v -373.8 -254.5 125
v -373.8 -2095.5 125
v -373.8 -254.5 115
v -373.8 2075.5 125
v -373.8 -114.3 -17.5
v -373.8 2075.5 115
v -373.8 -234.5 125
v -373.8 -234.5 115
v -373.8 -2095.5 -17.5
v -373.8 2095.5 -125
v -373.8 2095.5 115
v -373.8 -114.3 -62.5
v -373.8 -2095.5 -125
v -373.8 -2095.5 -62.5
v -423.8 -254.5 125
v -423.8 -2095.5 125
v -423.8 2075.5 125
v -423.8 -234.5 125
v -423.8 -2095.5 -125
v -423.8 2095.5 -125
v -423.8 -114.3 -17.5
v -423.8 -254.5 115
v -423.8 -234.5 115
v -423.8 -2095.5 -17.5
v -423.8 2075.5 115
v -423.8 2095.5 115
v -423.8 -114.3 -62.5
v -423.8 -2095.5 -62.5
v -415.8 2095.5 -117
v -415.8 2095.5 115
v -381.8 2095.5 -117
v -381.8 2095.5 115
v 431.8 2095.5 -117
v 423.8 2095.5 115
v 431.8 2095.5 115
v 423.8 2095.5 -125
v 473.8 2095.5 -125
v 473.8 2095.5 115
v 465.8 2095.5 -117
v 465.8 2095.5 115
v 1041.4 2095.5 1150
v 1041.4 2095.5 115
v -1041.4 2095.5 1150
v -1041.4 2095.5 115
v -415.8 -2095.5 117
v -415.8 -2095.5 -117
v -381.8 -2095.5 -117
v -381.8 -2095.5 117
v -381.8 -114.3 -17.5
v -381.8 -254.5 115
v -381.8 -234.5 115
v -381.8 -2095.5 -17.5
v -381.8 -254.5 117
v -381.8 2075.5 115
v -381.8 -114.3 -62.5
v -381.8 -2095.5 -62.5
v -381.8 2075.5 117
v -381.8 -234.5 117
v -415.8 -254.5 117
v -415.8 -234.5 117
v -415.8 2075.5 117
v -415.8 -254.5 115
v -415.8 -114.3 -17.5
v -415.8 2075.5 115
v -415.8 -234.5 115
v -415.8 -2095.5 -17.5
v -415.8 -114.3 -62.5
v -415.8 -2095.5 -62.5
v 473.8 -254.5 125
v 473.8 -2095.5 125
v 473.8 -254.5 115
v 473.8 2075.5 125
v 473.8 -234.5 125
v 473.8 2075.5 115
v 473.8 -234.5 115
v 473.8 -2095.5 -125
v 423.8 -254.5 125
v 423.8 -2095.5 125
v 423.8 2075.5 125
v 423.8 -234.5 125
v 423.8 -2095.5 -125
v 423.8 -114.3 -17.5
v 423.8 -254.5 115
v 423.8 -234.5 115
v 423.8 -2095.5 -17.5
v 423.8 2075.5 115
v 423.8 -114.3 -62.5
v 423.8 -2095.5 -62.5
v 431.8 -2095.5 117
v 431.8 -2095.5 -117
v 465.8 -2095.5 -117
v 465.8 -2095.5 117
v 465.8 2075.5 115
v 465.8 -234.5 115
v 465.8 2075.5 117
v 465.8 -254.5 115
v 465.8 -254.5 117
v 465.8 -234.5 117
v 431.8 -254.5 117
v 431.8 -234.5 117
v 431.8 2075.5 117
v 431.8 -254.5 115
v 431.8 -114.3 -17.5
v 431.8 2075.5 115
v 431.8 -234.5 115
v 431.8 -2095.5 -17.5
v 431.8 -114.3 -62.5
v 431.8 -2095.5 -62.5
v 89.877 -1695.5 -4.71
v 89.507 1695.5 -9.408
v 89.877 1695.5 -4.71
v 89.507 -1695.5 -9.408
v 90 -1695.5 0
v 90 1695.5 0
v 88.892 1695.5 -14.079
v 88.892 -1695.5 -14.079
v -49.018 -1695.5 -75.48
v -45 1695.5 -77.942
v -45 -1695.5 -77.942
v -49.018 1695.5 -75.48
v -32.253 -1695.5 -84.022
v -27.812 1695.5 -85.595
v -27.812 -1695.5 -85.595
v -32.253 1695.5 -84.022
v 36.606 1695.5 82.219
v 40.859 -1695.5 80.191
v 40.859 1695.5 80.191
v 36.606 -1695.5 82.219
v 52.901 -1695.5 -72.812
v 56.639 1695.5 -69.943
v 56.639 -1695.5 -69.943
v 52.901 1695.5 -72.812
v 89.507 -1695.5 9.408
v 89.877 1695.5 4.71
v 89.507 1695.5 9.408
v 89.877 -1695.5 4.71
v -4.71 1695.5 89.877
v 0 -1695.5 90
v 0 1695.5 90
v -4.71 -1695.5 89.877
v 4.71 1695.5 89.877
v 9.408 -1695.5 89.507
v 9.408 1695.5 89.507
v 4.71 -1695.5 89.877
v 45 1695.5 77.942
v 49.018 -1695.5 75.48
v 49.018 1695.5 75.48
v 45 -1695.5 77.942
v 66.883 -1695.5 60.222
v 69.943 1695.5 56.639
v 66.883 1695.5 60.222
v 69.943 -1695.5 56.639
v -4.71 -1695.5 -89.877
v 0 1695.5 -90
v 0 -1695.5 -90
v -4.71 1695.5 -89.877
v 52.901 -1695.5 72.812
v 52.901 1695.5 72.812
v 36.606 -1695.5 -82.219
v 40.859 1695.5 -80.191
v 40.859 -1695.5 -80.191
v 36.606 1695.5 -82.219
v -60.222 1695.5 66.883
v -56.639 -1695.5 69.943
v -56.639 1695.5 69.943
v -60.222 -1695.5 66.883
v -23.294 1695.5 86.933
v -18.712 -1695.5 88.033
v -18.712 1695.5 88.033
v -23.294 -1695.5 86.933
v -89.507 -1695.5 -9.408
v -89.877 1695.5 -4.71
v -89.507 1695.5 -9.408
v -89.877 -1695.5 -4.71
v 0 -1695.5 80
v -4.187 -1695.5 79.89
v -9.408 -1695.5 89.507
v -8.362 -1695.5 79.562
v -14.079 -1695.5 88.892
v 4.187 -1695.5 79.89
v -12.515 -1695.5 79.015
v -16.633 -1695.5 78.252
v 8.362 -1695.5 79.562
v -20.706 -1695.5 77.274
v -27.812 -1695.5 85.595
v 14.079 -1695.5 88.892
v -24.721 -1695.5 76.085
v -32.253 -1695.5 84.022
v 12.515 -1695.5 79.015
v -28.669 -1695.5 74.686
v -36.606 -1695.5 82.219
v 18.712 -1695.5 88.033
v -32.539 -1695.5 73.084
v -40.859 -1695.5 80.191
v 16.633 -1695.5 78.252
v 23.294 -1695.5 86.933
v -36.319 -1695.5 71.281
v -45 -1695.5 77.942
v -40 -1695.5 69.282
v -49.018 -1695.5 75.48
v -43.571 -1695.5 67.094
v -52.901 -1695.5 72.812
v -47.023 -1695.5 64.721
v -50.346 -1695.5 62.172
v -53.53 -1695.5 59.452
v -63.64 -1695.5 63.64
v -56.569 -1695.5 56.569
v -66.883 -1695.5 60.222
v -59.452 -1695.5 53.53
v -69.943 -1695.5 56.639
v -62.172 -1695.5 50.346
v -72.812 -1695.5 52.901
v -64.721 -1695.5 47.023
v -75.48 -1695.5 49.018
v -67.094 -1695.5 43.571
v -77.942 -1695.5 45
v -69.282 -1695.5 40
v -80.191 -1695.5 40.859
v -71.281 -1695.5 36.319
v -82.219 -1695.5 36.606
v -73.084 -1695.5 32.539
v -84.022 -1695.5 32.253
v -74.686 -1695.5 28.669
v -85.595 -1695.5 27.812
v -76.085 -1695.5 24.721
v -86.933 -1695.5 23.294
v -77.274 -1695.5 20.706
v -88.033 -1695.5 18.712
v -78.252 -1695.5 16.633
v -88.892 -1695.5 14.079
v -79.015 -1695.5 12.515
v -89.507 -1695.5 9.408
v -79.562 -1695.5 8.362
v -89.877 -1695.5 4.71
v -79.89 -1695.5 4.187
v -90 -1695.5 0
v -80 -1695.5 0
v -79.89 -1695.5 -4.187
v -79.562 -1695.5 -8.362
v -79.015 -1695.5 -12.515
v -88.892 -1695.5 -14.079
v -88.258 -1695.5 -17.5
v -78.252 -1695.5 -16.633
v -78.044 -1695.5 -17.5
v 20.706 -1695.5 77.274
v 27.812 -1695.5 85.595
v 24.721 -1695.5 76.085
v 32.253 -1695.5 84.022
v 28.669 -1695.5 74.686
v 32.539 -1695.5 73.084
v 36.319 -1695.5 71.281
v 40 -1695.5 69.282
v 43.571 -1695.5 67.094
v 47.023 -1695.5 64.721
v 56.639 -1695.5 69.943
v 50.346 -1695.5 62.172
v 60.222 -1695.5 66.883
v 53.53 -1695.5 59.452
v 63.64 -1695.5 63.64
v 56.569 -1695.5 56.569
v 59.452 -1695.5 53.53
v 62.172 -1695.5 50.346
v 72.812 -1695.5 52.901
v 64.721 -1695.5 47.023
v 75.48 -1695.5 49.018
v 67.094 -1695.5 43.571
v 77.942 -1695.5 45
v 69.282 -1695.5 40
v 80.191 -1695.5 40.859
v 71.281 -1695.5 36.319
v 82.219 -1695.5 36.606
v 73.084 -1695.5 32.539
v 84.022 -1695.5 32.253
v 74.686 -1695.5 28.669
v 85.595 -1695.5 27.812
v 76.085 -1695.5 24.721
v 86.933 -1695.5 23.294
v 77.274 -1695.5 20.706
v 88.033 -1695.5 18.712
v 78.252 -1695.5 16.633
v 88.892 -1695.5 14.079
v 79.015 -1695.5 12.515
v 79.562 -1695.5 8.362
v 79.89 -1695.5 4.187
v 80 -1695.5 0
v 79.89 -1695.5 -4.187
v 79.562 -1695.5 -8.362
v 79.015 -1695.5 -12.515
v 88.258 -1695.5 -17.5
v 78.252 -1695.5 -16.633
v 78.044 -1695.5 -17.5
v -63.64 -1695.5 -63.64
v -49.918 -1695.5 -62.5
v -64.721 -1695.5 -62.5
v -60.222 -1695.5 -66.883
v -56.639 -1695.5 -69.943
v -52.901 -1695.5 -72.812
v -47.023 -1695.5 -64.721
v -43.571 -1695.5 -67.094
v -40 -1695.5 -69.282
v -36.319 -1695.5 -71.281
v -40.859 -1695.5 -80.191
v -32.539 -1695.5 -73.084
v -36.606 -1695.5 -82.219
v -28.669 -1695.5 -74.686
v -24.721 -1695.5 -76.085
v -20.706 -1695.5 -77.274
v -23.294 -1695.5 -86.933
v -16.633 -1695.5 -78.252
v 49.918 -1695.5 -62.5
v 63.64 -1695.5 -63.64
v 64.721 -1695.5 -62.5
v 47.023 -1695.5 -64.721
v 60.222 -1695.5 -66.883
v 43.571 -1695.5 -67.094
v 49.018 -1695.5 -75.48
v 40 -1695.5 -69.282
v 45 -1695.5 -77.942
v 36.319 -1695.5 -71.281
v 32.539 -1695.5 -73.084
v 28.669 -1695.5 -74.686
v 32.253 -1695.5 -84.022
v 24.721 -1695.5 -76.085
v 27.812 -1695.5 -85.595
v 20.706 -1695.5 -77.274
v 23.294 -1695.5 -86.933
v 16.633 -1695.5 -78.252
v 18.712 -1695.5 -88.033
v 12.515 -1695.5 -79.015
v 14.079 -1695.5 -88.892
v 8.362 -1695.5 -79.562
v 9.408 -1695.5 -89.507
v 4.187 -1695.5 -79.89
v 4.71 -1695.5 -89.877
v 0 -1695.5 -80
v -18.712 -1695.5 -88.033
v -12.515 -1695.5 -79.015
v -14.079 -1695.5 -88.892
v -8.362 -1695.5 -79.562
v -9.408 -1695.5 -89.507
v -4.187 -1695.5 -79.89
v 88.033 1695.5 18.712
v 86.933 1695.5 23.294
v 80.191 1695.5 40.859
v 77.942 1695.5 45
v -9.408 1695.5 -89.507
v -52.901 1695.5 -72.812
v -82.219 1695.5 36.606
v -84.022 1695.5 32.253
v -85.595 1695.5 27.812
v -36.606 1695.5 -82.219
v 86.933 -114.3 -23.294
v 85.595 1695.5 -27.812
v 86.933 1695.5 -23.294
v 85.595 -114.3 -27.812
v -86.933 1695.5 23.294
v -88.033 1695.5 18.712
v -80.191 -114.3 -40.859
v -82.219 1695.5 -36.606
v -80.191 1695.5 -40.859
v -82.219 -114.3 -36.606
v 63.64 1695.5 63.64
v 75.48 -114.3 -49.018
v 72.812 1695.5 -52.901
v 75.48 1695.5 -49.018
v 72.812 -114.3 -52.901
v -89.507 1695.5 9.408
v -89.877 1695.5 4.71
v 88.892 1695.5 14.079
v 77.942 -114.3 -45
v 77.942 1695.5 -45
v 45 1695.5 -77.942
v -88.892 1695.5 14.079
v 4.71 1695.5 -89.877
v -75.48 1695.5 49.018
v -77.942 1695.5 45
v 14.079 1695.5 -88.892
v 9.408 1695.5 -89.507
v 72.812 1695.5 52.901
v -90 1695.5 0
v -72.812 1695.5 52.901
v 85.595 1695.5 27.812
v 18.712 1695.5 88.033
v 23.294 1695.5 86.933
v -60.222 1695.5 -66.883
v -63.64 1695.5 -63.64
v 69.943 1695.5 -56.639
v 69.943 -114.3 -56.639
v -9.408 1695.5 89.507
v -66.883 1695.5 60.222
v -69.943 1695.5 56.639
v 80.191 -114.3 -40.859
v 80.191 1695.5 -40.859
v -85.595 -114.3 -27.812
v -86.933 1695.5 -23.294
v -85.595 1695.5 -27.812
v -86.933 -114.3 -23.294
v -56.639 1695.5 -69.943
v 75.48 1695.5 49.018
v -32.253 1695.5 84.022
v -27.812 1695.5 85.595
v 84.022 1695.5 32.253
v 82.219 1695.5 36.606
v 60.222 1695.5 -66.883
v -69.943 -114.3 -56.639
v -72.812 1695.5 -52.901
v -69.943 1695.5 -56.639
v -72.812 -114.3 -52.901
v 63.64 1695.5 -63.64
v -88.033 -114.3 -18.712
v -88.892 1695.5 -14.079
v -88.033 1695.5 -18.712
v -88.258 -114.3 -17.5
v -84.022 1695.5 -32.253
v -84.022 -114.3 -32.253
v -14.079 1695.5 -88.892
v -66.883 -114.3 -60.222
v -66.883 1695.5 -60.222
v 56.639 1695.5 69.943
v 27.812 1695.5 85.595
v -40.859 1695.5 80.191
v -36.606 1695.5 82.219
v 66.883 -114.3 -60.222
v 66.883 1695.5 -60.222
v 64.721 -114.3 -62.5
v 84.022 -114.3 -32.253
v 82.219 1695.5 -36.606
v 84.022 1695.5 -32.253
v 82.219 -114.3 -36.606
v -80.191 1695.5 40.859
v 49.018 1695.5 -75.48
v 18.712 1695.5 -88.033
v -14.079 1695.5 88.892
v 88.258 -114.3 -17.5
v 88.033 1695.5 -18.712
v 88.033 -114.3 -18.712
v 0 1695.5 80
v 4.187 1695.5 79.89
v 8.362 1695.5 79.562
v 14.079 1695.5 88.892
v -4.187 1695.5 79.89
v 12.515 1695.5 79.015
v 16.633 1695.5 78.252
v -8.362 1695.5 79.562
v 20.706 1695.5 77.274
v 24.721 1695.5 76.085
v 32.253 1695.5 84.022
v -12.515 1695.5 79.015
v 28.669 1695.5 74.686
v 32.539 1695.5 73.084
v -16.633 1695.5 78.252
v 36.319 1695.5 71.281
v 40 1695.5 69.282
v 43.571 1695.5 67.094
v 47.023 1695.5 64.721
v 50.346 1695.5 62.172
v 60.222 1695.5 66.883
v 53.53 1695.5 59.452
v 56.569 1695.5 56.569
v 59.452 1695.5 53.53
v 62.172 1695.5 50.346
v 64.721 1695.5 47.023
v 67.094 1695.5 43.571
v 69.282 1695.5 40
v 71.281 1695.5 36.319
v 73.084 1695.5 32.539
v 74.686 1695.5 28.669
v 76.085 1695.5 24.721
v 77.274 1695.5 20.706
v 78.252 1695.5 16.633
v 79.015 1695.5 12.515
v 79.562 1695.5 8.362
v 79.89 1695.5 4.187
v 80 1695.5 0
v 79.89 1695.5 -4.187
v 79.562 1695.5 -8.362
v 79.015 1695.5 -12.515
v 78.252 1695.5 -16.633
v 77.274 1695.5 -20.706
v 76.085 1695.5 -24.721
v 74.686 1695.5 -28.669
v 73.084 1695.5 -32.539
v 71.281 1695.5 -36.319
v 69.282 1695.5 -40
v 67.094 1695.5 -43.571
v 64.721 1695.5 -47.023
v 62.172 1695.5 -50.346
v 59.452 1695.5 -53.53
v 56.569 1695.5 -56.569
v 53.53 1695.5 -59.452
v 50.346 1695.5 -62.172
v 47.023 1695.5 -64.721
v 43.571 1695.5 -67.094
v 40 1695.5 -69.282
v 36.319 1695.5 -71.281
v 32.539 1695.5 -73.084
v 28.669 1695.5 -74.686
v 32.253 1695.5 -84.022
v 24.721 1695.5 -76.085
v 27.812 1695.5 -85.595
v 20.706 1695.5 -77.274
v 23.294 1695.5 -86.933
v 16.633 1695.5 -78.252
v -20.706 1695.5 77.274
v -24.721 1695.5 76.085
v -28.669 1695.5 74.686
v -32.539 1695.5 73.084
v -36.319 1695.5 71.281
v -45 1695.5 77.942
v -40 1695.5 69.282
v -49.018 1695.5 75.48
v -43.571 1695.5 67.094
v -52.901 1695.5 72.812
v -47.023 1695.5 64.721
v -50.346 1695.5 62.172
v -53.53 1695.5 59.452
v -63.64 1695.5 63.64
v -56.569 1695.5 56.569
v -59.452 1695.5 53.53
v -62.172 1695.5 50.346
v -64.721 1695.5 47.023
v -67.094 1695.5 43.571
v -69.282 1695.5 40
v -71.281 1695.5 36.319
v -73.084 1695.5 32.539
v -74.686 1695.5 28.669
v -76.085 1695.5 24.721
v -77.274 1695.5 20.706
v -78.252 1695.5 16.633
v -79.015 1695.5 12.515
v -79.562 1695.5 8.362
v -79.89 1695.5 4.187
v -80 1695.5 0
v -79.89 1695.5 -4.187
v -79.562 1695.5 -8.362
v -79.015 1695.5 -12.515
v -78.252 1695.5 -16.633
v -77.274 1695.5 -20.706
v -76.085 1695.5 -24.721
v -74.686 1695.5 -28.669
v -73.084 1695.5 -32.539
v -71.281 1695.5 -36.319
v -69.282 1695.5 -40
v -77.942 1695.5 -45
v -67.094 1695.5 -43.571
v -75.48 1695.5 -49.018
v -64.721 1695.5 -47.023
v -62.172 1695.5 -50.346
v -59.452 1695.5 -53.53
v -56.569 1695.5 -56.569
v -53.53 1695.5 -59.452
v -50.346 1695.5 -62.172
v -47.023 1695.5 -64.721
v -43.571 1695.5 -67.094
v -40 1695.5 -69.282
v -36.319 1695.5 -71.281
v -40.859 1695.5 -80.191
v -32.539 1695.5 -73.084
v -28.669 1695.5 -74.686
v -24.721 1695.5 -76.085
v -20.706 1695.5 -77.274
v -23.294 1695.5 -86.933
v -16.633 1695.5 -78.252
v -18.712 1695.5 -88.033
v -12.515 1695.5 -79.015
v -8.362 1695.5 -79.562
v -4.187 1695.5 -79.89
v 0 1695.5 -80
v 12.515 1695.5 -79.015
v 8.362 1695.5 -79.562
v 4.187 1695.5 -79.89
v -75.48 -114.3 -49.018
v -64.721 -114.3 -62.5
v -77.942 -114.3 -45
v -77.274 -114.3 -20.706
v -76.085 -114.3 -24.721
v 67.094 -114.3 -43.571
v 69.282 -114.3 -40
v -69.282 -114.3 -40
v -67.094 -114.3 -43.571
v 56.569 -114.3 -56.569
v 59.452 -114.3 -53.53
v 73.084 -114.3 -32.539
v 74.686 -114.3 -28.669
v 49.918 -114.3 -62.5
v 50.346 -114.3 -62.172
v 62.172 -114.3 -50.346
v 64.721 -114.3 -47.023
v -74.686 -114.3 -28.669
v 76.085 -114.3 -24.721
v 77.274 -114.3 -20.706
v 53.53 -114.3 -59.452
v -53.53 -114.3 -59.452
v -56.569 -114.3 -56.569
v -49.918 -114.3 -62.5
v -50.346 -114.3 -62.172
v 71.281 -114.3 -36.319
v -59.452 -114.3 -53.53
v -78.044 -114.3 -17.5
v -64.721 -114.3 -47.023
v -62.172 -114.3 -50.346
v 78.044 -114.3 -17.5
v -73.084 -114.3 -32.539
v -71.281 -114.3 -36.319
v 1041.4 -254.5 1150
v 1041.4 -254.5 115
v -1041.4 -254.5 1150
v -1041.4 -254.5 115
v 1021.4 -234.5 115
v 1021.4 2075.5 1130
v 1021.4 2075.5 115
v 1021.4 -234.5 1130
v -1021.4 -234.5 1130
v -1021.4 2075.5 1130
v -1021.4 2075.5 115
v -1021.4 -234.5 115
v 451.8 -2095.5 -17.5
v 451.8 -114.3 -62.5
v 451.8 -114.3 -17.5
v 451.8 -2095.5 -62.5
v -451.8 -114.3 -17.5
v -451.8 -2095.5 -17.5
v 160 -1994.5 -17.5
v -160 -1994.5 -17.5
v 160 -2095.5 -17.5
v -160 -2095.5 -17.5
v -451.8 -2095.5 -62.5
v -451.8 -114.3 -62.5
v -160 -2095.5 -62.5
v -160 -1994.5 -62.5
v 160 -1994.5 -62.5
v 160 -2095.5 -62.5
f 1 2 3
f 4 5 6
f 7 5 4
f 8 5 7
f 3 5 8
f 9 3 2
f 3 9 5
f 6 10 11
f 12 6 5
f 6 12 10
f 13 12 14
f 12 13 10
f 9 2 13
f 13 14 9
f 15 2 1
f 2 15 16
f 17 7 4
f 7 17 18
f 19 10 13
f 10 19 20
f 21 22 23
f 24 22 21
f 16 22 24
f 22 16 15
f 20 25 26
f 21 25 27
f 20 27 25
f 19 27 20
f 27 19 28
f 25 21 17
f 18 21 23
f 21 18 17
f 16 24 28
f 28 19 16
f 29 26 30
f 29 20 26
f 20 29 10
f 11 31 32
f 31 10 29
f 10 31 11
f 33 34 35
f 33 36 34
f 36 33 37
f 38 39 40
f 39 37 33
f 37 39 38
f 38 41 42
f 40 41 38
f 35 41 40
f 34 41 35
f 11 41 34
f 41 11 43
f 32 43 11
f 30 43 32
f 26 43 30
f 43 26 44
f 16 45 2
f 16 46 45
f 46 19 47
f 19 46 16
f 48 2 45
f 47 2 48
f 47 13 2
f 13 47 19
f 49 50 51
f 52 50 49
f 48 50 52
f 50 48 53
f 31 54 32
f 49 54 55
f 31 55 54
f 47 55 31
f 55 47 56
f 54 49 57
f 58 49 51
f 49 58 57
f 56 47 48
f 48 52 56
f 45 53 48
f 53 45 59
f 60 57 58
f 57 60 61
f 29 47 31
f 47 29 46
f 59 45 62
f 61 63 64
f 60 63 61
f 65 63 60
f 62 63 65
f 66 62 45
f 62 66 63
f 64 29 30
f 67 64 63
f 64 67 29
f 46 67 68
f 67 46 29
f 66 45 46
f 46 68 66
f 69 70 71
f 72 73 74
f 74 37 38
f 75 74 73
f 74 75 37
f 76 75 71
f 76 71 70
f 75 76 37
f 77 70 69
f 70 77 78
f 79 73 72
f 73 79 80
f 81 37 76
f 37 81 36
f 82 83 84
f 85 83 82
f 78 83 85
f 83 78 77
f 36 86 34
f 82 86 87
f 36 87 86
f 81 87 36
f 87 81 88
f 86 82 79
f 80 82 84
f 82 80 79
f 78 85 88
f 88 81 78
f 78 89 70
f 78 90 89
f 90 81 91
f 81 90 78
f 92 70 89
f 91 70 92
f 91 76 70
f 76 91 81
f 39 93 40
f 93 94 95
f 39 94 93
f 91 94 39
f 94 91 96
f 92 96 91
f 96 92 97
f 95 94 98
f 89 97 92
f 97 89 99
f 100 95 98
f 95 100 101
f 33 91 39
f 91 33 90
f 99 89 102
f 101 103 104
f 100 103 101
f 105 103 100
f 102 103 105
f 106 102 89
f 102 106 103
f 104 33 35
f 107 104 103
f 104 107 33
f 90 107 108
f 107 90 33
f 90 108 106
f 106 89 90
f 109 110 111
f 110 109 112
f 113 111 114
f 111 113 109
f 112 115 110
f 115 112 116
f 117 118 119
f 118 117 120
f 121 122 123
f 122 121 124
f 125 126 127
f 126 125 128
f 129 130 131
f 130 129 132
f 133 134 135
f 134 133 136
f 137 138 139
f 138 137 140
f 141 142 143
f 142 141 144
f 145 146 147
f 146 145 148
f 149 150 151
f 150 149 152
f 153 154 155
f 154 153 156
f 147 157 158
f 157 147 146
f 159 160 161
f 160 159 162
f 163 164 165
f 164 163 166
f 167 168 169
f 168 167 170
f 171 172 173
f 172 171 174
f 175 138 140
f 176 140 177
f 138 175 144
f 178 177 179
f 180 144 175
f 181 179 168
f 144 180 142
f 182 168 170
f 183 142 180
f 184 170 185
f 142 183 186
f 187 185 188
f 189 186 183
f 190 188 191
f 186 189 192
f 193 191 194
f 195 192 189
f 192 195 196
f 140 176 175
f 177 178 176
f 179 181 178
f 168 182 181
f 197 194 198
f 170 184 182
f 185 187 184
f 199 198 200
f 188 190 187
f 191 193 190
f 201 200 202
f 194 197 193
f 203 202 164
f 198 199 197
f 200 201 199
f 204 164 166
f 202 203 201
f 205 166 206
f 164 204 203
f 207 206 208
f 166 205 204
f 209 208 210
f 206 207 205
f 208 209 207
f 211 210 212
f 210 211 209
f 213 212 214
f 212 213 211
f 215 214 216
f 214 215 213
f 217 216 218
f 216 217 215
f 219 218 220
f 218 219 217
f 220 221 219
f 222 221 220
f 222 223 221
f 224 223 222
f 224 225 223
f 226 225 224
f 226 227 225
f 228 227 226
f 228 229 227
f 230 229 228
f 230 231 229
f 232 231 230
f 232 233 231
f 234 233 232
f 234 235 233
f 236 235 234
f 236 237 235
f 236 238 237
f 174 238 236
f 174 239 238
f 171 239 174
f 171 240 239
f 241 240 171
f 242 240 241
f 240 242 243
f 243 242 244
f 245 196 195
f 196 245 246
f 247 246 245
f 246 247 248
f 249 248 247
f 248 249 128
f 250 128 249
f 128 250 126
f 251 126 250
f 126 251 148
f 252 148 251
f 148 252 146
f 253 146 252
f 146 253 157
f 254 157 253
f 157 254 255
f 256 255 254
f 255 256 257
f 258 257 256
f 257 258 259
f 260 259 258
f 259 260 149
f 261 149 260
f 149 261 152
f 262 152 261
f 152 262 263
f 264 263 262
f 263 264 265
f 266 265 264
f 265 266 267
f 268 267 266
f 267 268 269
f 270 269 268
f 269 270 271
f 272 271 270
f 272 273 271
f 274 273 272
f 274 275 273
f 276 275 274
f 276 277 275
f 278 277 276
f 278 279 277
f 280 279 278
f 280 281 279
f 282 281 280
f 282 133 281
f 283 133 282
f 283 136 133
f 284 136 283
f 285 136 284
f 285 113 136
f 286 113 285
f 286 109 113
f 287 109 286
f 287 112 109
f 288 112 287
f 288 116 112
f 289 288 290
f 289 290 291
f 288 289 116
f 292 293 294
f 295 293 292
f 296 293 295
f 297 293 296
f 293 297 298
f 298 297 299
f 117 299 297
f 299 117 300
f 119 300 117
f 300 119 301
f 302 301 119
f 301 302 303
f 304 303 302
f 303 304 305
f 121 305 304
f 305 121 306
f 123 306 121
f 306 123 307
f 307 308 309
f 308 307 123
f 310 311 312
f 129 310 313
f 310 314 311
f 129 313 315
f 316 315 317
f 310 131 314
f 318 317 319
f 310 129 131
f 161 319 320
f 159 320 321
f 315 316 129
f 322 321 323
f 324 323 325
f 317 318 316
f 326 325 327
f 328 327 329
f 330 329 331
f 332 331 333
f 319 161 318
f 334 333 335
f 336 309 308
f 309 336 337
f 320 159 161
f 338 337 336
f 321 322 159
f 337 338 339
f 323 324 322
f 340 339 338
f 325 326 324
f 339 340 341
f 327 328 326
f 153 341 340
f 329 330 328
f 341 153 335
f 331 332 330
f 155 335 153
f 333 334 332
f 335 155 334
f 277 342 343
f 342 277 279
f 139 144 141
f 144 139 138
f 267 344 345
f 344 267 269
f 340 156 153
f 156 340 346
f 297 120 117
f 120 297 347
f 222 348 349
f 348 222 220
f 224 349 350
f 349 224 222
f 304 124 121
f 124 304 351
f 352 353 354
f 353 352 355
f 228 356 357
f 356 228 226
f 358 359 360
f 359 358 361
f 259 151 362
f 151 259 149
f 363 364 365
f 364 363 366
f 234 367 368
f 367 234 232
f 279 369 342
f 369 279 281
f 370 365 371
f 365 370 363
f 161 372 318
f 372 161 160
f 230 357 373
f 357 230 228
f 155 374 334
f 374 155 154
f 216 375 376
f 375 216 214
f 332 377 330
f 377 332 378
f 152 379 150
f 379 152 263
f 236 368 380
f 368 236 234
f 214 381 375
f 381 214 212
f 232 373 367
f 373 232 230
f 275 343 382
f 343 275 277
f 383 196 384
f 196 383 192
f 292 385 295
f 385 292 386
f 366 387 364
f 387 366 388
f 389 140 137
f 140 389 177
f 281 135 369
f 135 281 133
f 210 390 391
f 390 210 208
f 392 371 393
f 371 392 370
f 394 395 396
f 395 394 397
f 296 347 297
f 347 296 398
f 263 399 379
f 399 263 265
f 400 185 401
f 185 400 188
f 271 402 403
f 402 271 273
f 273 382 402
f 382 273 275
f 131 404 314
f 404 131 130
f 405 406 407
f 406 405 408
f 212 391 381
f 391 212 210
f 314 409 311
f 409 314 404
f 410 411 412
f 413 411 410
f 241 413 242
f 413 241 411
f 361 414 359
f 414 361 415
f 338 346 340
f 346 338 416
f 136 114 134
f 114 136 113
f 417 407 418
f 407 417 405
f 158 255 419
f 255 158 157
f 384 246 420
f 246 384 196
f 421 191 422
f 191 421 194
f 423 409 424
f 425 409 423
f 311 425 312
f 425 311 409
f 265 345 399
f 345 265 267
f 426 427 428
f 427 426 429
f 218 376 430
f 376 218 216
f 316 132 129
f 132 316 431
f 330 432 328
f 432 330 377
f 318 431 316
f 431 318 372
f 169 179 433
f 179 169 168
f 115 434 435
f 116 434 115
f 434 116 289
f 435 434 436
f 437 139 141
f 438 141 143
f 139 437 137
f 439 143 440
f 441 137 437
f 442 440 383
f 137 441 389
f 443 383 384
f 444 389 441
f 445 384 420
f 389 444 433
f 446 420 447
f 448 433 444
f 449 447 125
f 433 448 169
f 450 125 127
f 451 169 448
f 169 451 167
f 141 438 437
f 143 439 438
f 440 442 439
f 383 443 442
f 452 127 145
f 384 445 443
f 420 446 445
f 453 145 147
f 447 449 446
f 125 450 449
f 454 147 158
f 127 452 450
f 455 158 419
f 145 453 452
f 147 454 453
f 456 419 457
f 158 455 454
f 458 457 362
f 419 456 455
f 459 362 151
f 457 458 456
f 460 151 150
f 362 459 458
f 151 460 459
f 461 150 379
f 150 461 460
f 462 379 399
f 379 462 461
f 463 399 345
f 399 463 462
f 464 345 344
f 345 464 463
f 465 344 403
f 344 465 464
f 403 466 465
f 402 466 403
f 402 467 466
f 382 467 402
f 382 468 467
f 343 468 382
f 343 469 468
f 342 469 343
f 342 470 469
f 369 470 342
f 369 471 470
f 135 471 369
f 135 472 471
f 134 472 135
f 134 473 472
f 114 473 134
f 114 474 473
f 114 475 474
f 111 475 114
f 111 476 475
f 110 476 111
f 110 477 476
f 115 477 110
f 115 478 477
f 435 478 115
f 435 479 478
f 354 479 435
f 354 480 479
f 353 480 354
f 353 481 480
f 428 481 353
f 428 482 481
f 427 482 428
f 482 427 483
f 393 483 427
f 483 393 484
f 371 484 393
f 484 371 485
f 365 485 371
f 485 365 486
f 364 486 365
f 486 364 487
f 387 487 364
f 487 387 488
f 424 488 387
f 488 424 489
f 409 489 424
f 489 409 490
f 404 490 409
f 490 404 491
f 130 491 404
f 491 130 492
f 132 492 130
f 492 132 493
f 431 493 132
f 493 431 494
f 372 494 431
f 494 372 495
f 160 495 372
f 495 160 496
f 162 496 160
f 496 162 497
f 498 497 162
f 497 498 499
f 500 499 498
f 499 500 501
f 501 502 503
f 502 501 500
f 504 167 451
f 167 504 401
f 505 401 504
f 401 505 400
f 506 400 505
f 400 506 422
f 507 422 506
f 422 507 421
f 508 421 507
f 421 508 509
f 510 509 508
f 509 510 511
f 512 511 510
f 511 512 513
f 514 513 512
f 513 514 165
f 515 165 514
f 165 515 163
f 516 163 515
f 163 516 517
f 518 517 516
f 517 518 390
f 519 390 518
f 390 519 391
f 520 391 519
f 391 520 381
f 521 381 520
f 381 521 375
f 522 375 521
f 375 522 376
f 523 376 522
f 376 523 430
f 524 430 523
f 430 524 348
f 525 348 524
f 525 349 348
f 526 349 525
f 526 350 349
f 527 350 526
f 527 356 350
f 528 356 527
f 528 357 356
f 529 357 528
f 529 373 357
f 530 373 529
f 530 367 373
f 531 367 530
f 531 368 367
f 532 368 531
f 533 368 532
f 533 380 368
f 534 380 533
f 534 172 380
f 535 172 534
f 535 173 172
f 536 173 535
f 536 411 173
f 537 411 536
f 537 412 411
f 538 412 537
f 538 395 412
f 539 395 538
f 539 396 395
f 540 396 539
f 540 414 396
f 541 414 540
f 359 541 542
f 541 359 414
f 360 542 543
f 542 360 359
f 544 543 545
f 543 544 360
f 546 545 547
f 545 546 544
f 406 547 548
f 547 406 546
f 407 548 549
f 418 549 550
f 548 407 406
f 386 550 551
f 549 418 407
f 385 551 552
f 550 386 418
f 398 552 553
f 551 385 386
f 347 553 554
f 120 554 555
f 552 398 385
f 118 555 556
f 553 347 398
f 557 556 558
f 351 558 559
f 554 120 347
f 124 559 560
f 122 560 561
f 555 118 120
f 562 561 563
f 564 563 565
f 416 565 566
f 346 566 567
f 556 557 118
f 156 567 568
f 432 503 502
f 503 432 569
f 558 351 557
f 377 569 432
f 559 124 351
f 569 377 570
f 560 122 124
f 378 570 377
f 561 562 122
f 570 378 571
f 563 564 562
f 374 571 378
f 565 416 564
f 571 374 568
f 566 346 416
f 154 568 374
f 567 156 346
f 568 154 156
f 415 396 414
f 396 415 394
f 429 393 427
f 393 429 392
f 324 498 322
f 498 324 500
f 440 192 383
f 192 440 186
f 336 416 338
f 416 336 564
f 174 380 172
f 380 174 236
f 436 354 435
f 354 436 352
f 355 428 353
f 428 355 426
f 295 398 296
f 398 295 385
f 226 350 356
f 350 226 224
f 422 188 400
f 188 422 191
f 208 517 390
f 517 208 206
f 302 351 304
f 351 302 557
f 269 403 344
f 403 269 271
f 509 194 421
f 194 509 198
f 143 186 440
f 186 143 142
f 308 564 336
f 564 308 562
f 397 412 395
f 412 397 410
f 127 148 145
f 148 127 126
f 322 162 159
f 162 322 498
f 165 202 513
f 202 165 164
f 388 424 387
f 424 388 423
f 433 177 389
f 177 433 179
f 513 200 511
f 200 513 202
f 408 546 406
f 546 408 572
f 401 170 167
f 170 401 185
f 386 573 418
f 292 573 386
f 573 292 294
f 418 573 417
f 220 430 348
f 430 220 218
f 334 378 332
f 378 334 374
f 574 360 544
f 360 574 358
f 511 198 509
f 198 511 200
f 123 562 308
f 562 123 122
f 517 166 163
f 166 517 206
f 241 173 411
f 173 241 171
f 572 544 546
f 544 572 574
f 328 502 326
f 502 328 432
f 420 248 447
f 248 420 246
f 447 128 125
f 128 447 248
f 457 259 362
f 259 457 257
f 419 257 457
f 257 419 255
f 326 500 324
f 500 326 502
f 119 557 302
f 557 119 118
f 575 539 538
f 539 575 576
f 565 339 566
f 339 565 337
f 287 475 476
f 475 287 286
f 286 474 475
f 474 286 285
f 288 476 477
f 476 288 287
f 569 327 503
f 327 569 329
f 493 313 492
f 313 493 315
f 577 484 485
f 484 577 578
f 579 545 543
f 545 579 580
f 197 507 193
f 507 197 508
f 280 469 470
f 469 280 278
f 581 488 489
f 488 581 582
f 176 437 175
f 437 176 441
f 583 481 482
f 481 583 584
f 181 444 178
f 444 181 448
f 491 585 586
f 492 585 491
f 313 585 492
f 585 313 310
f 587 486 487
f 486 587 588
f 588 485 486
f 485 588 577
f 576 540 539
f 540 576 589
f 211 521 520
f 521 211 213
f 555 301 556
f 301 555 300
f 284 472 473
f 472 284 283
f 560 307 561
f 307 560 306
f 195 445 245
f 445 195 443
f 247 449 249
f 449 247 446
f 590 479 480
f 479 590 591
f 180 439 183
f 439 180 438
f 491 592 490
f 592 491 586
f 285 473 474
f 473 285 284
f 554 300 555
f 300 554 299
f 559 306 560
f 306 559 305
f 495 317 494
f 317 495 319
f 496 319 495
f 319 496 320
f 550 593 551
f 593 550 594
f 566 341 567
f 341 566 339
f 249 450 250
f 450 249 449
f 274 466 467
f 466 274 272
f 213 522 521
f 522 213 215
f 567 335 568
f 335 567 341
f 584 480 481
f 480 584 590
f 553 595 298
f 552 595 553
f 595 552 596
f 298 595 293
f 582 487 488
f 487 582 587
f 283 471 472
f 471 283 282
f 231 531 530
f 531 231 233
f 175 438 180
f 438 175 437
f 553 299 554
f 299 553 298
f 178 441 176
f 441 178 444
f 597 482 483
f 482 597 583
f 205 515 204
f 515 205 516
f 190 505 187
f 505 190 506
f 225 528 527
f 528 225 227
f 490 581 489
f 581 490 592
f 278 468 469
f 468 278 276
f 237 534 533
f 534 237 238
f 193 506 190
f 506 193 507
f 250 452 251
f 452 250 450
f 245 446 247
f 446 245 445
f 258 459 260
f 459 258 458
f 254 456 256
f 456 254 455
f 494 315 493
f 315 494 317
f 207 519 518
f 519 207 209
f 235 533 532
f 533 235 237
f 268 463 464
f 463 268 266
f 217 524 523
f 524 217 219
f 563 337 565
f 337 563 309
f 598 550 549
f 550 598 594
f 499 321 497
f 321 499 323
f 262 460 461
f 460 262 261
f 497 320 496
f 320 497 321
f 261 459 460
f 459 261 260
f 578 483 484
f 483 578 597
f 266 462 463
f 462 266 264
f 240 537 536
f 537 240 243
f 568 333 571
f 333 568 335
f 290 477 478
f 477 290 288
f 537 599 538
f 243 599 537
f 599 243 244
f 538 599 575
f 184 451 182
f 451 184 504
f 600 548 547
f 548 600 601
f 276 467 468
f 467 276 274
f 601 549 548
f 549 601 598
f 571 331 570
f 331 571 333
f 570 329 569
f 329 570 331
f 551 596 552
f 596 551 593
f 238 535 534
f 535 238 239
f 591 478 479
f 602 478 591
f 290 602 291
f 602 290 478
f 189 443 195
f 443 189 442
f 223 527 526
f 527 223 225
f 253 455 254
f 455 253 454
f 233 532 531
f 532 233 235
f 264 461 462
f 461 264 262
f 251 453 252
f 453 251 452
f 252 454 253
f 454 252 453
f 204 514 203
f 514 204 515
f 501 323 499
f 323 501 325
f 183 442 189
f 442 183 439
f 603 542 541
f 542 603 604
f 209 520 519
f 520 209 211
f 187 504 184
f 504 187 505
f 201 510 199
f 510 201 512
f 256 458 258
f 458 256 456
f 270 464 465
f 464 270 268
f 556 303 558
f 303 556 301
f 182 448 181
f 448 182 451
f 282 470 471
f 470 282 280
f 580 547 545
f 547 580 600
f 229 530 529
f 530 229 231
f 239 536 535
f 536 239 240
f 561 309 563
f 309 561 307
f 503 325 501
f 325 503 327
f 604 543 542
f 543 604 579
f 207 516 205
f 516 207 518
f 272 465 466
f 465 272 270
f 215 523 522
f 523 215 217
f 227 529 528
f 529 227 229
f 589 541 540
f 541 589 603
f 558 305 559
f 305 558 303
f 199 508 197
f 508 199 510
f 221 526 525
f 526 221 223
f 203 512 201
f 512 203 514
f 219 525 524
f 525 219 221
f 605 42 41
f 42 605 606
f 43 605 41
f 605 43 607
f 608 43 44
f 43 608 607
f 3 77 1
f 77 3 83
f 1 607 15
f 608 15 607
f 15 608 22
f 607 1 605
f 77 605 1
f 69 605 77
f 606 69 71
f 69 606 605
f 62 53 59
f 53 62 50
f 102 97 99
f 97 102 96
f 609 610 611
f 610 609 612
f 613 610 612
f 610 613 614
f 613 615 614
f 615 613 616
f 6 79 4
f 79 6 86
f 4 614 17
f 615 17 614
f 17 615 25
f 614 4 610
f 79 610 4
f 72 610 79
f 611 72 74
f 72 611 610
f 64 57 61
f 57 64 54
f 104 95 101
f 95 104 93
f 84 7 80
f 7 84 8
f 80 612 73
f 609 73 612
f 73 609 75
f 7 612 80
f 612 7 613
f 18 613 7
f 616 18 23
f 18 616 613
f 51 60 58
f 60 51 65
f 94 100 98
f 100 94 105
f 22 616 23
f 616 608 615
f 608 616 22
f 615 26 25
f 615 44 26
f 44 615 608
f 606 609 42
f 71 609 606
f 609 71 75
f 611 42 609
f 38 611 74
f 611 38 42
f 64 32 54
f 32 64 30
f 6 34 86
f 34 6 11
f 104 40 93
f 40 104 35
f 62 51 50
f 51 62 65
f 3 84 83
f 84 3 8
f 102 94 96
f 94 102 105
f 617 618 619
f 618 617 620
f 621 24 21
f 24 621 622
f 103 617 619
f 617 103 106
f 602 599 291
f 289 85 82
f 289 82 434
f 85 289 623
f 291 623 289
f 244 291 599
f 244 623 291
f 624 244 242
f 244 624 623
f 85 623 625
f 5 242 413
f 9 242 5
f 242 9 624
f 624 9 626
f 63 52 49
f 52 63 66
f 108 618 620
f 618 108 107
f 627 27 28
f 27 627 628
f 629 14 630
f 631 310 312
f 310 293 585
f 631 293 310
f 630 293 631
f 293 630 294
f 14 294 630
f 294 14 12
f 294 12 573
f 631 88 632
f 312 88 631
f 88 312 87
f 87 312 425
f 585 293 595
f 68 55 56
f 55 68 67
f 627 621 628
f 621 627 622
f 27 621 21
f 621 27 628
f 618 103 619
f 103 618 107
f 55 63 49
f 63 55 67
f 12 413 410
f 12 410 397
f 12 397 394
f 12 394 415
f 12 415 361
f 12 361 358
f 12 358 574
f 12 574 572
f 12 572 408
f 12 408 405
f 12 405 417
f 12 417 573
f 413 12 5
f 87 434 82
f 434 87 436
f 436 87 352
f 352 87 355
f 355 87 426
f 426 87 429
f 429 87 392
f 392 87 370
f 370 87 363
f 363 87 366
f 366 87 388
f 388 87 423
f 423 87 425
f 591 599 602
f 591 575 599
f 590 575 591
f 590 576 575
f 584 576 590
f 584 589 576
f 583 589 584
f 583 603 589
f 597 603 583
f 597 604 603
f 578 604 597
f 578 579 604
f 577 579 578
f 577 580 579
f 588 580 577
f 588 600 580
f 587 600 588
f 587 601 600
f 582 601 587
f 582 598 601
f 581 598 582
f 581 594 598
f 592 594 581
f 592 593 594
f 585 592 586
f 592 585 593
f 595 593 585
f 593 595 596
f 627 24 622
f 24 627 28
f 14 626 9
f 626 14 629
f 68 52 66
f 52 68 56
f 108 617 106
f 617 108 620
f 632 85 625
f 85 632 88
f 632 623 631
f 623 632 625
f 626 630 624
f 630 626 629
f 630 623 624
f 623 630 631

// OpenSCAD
// ====================================================================================
// REVOLUTIONARY TECHNOLOGY COMPANY & UNIVERSITY OF WASHINGTON DEPARTMENT OF PHYSICS
// Subsystem: silverado_md_long_king_cab.scad (Extended Cab / Short Bed on 165" Frame)
// Core Application: Re-Apportioning the Original Long-Wheelbase Chassis Matrix
// COMPLIANCE GATE: Maintains absolute 65mm lower open clearance for underbody plates
// Center Origin (0,0,0) = Mid-point of the Original 165-Inch Frame Baseline Rail Axis
// ====================================================================================

$fn = 120; // High-precision CNC cutting and welding profile depth resolution

// --- Original 165" Wheelbase Structural Constants (mm) ---
inch_to_mm         = 25.4;
original_wheelbase = 165.0 * inch_to_mm; // Maintained original 4191.00 mm frame length [INDEX]
frame_rail_spacing = 34.0 * inch_to_mm;  // 863.60 mm standard straight truck rail width [INDEX]
rail_height_mm     = 250.00;             // Deep 10-inch heavy commercial profile [INDEX]
rail_thickness_ti  = 8.00;               // Reinforced 8mm structural frame walls [INDEX]

// Re-Apportioned Superstructure Constraints
extended_cab_len   = 2350.00;            // Extended cabin envelope length [INDEX]
short_bed_len      = 78.0 * inch_to_mm;  // Compact 6.5-Foot cargo upfit bed (1981.20 mm depth) [INDEX]
UNDER_ARMOR_CLEARANCE_MM = 65.00;        // Mandatory open installation layer [INDEX]

module original_165_boxed_rails() {
    echo("COMPILING RE-APPORTIONED SUPERSTRUCTURE OVER ORIGINAL 165 INCH CHASSIS RAILS");
    for (side = [-1, 1]) {
        translate([side * (frame_rail_spacing/2 - rail_thickness_ti), -original_wheelbase/2, -rail_height_mm/2]) {
            color("DimGrey") {
                difference() {
                    // Boxed longitudinal Titanium Grade 5 frame rail channel beam [INDEX]
                    cube([50, original_wheelbase, rail_height_mm]);
                    // Hollow interior core step-down saving dead weight
                    translate([rail_thickness_ti, -1, rail_thickness_ti])
                        cube([50 - (2*rail_thickness_ti), original_wheelbase + 2, rail_height_mm - (2*rail_thickness_ti)]);
                }
            }
        }
    }
}

module active_magnetic_driveline_tunnel() {
    // Original center electromagnetic tunnel remains physically continuous [INDEX]
    color("DarkSlateGrey") {
        rotate([-90, 0, 0]) {
            difference() {
                cylinder(d=180, h=original_wheelbase - 800, center=true);
                cylinder(d=160, h=original_wheelbase - 798, center=true);
            }
        }
    }
}

module integrated_armored_king_cab_placement() {
    // 12.5mm internal anti-intrusion cage positioned over the original firewall coordinates [INDEX]
    translate([0, original_wheelbase/2 - extended_cab_len/2, 600]) {
        color("SlateGrey") {
            difference() {
                cube([82.0 * inch_to_mm, extended_cab_len, 1100], center=true);
                cube([82.0 * inch_to_mm - 40, extended_cab_len - 40, 1060], center=true); // Hollow inner cockpit [INDEX]
                
                // Lower clearance vector protecting the 65mm skid plate layer [INDEX]
                translate([0, 0, -550])
                    cube([82.0 * inch_to_mm + 10, extended_cab_len + 10, UNDER_ARMOR_CLEARANCE_MM * 2], center=true);
            }
        }
    }
}

module short_bed_indexed_rear_upfit() {
    // Anchors the short bed flush against the frame tail, leaving the mid-chassis utility gap open [INDEX]
    translate([0, -original_wheelbase/2 + short_bed_len/2, -40]) {
        color("DarkSlateGrey") {
            difference() {
                // Short-bed interface platform grid [INDEX]
                cube([frame_rail_spacing + 40, short_bed_len, 45], center=true);
                // 100mm frame-tail clearance notch to house the 15,000-lb recovery winch [INDEX]
                translate([0, -short_bed_len/2 + 50, 0])
                    cube([320.0, 102.0, 50.0], center=true);
            }
        }
    }
}

// --- Composite Chassis Integration Instantiation ---
union() {
    original_165_boxed_rails();
    active_magnetic_driveline_tunnel();
    integrated_armored_king_cab_placement();
    short_bed_indexed_rear_upfit();
}
